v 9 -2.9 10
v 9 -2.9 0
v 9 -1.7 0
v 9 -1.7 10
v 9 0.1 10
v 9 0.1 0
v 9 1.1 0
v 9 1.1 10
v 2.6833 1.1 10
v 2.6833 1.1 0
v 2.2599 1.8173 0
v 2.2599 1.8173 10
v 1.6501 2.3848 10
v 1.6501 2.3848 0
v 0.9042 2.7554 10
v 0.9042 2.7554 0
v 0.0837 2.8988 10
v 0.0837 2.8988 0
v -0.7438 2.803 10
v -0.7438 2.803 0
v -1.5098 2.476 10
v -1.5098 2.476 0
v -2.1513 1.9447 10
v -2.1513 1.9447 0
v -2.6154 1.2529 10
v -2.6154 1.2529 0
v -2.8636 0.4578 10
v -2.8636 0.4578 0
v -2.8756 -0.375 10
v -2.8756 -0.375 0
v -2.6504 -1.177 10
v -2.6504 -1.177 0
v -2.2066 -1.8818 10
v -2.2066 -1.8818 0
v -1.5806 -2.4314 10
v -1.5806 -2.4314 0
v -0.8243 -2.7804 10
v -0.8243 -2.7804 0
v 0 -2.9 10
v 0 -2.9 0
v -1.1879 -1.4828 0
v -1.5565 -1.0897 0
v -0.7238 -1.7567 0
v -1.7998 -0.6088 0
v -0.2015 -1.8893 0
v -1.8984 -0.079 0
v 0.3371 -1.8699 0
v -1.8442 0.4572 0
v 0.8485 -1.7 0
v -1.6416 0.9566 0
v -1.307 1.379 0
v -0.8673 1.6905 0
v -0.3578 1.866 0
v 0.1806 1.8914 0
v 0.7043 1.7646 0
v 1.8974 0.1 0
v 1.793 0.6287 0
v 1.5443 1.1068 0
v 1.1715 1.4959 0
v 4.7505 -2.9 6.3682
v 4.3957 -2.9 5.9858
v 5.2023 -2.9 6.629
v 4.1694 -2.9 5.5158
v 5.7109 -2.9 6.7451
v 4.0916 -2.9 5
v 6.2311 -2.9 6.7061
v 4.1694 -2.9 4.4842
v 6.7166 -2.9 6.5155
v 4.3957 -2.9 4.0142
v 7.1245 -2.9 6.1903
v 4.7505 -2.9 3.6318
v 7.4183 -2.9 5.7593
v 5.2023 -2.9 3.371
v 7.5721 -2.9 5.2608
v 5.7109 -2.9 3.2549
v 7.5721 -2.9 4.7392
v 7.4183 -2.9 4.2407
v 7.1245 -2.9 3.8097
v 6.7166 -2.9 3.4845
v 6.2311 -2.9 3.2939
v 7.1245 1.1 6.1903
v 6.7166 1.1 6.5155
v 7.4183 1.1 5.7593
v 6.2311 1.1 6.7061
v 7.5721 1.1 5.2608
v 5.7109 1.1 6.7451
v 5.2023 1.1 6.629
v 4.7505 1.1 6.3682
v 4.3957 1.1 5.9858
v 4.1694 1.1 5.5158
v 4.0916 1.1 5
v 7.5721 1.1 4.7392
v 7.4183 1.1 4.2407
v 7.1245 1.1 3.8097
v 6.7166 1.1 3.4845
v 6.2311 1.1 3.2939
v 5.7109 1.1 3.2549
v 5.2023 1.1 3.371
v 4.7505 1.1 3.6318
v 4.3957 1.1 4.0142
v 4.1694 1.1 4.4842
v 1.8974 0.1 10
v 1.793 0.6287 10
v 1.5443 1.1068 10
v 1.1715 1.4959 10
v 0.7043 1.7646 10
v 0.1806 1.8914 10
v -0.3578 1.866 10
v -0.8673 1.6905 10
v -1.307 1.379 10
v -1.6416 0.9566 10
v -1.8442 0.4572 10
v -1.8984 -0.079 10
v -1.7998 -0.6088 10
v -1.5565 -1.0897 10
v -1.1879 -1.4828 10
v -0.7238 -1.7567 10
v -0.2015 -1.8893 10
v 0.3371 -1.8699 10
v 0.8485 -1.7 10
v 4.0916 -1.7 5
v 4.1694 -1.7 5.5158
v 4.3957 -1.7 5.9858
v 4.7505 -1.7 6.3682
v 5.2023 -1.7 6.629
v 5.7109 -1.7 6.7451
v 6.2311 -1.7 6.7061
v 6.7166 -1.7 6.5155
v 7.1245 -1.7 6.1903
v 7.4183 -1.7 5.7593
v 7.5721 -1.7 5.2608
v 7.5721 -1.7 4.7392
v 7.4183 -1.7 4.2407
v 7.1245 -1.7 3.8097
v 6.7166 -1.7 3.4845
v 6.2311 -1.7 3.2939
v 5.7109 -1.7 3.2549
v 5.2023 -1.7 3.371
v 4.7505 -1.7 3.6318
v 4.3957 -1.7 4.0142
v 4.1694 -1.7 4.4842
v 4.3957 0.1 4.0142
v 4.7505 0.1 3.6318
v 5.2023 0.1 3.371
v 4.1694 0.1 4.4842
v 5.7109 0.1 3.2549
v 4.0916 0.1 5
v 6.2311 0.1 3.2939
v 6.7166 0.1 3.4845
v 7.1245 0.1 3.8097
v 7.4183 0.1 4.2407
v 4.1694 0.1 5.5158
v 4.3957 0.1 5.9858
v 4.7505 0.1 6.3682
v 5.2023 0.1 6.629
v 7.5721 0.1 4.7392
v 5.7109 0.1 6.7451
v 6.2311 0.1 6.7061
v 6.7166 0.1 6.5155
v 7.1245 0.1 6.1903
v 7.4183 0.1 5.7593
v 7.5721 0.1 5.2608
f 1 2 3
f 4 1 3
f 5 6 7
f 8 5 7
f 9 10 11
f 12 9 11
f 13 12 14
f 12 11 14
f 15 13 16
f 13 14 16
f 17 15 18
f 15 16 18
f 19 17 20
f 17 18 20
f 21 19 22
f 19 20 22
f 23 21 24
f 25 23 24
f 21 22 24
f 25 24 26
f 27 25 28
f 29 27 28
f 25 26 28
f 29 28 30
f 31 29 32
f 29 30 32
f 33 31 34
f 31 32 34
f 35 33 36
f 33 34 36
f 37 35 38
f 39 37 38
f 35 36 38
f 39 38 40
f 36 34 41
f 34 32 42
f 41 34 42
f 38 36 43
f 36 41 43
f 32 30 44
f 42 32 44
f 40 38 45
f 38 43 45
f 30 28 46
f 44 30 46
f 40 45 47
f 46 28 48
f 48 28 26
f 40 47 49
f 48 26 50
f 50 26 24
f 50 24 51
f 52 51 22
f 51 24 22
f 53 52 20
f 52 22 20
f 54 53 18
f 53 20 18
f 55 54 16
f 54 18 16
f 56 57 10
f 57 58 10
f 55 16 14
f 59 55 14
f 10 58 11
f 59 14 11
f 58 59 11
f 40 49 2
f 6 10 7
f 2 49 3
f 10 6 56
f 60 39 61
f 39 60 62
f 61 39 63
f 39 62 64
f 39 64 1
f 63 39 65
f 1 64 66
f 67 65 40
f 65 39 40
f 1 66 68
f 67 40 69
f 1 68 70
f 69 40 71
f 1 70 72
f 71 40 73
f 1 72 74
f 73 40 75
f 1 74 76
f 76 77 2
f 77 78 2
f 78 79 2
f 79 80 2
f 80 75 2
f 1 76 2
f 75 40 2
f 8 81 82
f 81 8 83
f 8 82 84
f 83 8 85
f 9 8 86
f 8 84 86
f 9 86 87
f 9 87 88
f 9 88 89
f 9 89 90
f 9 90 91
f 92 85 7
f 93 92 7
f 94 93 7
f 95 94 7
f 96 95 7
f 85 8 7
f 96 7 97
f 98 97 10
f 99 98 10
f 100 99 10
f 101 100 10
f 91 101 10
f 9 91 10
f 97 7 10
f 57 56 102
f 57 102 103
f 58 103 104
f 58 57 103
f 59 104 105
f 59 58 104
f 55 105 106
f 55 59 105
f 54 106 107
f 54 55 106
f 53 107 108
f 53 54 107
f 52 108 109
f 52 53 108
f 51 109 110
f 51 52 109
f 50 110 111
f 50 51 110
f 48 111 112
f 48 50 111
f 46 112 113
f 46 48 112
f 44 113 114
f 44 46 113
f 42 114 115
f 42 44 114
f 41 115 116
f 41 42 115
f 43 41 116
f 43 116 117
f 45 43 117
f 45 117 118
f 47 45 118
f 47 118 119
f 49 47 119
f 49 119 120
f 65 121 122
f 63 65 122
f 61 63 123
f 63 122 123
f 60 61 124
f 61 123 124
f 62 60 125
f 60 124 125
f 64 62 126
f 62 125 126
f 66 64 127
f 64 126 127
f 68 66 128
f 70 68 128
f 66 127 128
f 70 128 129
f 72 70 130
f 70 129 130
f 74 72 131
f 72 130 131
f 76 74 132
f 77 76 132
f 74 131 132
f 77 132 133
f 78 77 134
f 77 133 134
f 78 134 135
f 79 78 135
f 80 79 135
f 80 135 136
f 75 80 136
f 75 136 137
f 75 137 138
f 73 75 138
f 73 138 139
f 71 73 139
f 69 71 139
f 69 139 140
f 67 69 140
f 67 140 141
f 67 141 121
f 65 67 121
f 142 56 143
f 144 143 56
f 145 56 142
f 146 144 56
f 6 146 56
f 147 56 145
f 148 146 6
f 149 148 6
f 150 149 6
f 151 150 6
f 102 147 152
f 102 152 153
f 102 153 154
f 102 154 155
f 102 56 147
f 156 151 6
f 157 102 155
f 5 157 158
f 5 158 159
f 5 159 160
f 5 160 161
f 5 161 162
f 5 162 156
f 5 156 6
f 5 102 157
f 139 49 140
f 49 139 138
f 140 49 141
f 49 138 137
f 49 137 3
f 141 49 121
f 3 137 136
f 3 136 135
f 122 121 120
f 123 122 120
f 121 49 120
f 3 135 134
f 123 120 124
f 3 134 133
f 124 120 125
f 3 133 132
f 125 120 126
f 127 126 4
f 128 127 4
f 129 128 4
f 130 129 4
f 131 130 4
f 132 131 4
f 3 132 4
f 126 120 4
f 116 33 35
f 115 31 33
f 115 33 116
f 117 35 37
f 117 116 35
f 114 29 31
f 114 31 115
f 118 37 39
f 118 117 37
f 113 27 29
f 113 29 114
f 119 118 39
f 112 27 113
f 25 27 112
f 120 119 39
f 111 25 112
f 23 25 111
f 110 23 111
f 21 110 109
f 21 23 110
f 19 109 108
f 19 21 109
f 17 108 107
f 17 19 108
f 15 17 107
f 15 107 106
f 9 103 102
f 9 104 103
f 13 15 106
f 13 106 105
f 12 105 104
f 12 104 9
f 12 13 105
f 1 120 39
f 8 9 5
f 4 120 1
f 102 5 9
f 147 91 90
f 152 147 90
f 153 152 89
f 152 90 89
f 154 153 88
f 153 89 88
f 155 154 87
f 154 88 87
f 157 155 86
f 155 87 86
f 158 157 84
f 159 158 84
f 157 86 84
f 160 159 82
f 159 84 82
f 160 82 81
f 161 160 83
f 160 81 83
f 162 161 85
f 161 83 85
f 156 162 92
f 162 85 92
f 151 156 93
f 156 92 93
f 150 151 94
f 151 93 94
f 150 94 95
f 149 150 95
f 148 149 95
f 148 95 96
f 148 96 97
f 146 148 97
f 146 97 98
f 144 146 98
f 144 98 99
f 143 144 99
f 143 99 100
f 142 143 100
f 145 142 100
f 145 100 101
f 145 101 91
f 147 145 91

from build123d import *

# Parameters (mm, degrees)
F0_R     = 1.9
F1_DEPTH = 10
F2_W     = 8.151472
F2_H     = 1.8
F3_DEPTH = 25
F4_R     = 1.75
F5_DEPTH = 25


with BuildPart() as f1:
    # F0 (on Top) → F1 (new body)
    with BuildSketch(Plane.XY):
        with BuildLine():
            ThreePointArc((0, -2.9), (2.05061, -2.05061), (2.9, 0))
            ThreePointArc((2.9, 0), (2.845305, 0.560573), (2.683282, 1.1))
            ThreePointArc((2.683282, 1.1), (-2.408319, 1.615549), (0, -2.9))
        make_face()
        Circle(F0_R, mode=Mode.SUBTRACT)
        with BuildLine():
            ThreePointArc((2.683282, 1.1), (2.845305, 0.560573), (2.9, 0))
            ThreePointArc((2.9, 0), (2.05061, -2.05061), (0, -2.9))
            Line((0, -2.9), (9, -2.9))
            Line((9, -2.9), (9, 1.1))
            Line((9, 1.1), (2.683282, 1.1))
        make_face()
    extrude(amount=F1_DEPTH)

    # F2 (on face) → F3 (cut)
    with BuildSketch(Plane.XY.offset(10)):
        with Locations((4.924264, -0.8)):
            Rectangle(F2_W, F2_H)
    extrude(amount=-F3_DEPTH, mode=Mode.SUBTRACT)

    # F4 (on face) → F5 (cut)
    with BuildSketch(Plane(origin=(0, 1.1, 0), x_dir=(-1, 0, 0), z_dir=(0, 1, 0))):
        with Locations((-5.841641, 5)):
            Circle(F4_R)
    extrude(amount=-F5_DEPTH, mode=Mode.SUBTRACT)


solid = f1.part
